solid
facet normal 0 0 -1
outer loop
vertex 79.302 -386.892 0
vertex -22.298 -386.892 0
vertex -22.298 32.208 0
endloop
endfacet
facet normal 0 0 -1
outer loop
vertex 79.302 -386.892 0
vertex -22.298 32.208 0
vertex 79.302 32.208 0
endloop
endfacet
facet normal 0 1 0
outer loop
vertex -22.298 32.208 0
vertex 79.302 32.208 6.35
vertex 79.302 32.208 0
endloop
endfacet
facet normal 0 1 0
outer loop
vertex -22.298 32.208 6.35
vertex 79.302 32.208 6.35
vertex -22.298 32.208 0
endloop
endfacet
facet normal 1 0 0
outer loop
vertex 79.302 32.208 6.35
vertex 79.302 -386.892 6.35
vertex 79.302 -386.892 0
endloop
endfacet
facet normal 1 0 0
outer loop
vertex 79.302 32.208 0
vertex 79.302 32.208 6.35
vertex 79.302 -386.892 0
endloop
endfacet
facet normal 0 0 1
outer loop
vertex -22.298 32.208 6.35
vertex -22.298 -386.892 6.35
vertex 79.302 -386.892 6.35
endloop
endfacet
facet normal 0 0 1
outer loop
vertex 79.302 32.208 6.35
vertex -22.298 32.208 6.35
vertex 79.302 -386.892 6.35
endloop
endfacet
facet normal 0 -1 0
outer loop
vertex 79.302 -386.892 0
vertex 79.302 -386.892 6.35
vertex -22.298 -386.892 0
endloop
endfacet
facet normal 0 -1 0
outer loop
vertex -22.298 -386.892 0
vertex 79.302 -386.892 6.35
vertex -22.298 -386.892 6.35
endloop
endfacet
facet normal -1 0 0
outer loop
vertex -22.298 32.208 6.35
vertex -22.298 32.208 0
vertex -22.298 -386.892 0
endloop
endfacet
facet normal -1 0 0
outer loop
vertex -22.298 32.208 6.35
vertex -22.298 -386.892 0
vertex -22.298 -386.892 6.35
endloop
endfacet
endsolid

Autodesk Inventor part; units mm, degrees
ref_plane "YZ Plane" through (0, 0, 0) normal (1, 0, 0) x (0, 1, 0)
ref_plane "XZ Plane" through (0, 0, 0) normal (0, 1, 0) x (-1, 0, 0)
ref_plane "XY Plane" through (0, 0, 0) normal (0, 0, 1) x (1, 0, 0)
sketch "Sketch1" plane through (0, 0, 0) normal (0, 0, 1) x (1, 0, 0)
  line L0 (-22.2985, 25.8576) -> (117.4015, 25.8576)
  line L1 (117.4015, 25.8576) -> (117.4015, -278.9424)
  line L2 (117.4015, -278.9424) -> (-22.2985, -278.9424)
  line L3 (-22.2985, -278.9424) -> (-22.2985, 25.8576)
  point P0 (0, 0)
  dimension "d0" = 139.7
  dimension "d1" = 304.8
extrude "Extrusion1" add sketch "Sketch1" along normal blind 6.35
sketch "Sketch2" plane through (117.4015, -278.9424, 0) normal (1, 0, 0) x (0, 0, -1)
  line L0 (-6.35, 304.8) -> (-6.35, 0) projected
  line L1 (0, 0) -> (-6.35, 0) projected
  line L2 (0, 304.8) -> (0, 0) projected
  line L3 (0, 304.8) -> (-6.35, 304.8) projected
  point P0 (0, 278.9424)
extrude "Extrusion2" add sketch "Sketch2" along normal blind 12.7
sketch "Sketch3" plane through (130.1015, -278.9424, 0) normal (1, 0, 0) x (0, 0, -1)
  line L0 (-6.35, 304.8) -> (0, 304.8) projected
  line L1 (-6.35, 0) -> (-6.35, 304.8) projected
  line L2 (0, 0) -> (-6.35, 0) projected
  line L3 (0, 304.8) -> (0, 0) projected
  point P0 (0, 278.9424)
extrude "Extrusion3" cut sketch "Sketch3" against normal blind 12.7
sketch "Sketch4" plane through (117.4015, -278.9424, 0) normal (1, 0, 0) x (0, 0, -1)
  line L0 (-6.35, 0) -> (-6.35, 304.8) projected
  line L1 (0, 0) -> (-6.35, 0) projected
  line L2 (0, 304.8) -> (0, 0) projected
  line L3 (-6.35, 304.8) -> (0, 304.8) projected
  point P0 (0, 278.9424)
extrude "Extrusion4" cut sketch "Sketch4" against normal blind 38.1
sketch "Sketch5" plane through (0, 0, 0) normal (0, 0, -1) x (-1, 0, 0)
  line L0 (-79.3015, -278.9424) -> (22.2985, -278.9424)
  line L1 (22.2985, -278.9424) -> (22.2985, -532.9424)
  line L2 (22.2985, -532.9424) -> (-79.3015, -532.9424)
  line L3 (-79.3015, -532.9424) -> (-79.3015, -278.9424)
  point P0 (0, 0)
  dimension "d10" = 254
extrude "Extrusion5" add sketch "Sketch5" against normal blind 6.35
sketch "Sketch6" plane through (-22.2985, -532.9424, 0) normal (0, -1, 0) x (1, 0, 0)
  line L0 (101.6, 6.35) -> (0, 6.35) projected
  line L1 (0, 0) -> (0, 6.35) projected
  line L2 (101.6, 0) -> (0, 0) projected
  line L3 (101.6, 0) -> (101.6, 6.35) projected
  point P0 (22.2985, 0)
extrude "Extrusion6" cut sketch "Sketch6" against normal blind 127
sketch "Sketch7" plane through (-22.2985, 25.8576, 6.35) normal (0, 1, 0) x (1, 0, 0)
  line L0 (101.6, 0) -> (101.6, 6.35) projected
  line L1 (0, 6.35) -> (101.6, 6.35) projected
  line L2 (0, 6.35) -> (0, 0) projected
  line L3 (0, 0) -> (101.6, 0) projected
  point P0 (22.2985, 6.35)
extrude "Extrusion7" add sketch "Sketch7" along normal blind 12.7
sketch "Sketch8" plane through (0, 0, 6.35) normal (0, 0, 1) x (1, 0, 0)
  line L0 (-22.2985, -405.9424) -> (79.3015, -405.9424) projected
  line L1 (79.3015, -405.9424) -> (79.3015, 38.5576) projected
  line L2 (-22.2985, -405.9424) -> (-22.2985, 38.5576) projected
  line L3 (79.3015, -405.9424) -> (79.3015, -386.8924)
  line L4 (79.3015, -386.8924) -> (-22.2985, -386.8924)
  point P0 (0, 0)
  dimension "d17" = 19.05
extrude "Extrusion8" cut sketch "Sketch8" against normal blind 25.4
sketch "Sketch9" plane through (0, 0, 6.35) normal (0, 0, 1) x (1, 0, 0)
  line L0 (79.3015, -386.8924) -> (79.3015, 38.5576) projected
  line L1 (-22.2985, 38.5576) -> (79.3015, 38.5576)
  line L2 (79.3015, 38.5576) -> (79.3015, 32.2076)
  line L3 (79.3015, 32.2076) -> (-22.2985, 32.2076)
  line L4 (-22.2985, 32.2076) -> (-22.2985, 38.5576)
  point P0 (0, 0)
  dimension "d20" = 6.35
extrude "Extrusion9" cut sketch "Sketch9" against normal blind 25.4
properties part number "side"
